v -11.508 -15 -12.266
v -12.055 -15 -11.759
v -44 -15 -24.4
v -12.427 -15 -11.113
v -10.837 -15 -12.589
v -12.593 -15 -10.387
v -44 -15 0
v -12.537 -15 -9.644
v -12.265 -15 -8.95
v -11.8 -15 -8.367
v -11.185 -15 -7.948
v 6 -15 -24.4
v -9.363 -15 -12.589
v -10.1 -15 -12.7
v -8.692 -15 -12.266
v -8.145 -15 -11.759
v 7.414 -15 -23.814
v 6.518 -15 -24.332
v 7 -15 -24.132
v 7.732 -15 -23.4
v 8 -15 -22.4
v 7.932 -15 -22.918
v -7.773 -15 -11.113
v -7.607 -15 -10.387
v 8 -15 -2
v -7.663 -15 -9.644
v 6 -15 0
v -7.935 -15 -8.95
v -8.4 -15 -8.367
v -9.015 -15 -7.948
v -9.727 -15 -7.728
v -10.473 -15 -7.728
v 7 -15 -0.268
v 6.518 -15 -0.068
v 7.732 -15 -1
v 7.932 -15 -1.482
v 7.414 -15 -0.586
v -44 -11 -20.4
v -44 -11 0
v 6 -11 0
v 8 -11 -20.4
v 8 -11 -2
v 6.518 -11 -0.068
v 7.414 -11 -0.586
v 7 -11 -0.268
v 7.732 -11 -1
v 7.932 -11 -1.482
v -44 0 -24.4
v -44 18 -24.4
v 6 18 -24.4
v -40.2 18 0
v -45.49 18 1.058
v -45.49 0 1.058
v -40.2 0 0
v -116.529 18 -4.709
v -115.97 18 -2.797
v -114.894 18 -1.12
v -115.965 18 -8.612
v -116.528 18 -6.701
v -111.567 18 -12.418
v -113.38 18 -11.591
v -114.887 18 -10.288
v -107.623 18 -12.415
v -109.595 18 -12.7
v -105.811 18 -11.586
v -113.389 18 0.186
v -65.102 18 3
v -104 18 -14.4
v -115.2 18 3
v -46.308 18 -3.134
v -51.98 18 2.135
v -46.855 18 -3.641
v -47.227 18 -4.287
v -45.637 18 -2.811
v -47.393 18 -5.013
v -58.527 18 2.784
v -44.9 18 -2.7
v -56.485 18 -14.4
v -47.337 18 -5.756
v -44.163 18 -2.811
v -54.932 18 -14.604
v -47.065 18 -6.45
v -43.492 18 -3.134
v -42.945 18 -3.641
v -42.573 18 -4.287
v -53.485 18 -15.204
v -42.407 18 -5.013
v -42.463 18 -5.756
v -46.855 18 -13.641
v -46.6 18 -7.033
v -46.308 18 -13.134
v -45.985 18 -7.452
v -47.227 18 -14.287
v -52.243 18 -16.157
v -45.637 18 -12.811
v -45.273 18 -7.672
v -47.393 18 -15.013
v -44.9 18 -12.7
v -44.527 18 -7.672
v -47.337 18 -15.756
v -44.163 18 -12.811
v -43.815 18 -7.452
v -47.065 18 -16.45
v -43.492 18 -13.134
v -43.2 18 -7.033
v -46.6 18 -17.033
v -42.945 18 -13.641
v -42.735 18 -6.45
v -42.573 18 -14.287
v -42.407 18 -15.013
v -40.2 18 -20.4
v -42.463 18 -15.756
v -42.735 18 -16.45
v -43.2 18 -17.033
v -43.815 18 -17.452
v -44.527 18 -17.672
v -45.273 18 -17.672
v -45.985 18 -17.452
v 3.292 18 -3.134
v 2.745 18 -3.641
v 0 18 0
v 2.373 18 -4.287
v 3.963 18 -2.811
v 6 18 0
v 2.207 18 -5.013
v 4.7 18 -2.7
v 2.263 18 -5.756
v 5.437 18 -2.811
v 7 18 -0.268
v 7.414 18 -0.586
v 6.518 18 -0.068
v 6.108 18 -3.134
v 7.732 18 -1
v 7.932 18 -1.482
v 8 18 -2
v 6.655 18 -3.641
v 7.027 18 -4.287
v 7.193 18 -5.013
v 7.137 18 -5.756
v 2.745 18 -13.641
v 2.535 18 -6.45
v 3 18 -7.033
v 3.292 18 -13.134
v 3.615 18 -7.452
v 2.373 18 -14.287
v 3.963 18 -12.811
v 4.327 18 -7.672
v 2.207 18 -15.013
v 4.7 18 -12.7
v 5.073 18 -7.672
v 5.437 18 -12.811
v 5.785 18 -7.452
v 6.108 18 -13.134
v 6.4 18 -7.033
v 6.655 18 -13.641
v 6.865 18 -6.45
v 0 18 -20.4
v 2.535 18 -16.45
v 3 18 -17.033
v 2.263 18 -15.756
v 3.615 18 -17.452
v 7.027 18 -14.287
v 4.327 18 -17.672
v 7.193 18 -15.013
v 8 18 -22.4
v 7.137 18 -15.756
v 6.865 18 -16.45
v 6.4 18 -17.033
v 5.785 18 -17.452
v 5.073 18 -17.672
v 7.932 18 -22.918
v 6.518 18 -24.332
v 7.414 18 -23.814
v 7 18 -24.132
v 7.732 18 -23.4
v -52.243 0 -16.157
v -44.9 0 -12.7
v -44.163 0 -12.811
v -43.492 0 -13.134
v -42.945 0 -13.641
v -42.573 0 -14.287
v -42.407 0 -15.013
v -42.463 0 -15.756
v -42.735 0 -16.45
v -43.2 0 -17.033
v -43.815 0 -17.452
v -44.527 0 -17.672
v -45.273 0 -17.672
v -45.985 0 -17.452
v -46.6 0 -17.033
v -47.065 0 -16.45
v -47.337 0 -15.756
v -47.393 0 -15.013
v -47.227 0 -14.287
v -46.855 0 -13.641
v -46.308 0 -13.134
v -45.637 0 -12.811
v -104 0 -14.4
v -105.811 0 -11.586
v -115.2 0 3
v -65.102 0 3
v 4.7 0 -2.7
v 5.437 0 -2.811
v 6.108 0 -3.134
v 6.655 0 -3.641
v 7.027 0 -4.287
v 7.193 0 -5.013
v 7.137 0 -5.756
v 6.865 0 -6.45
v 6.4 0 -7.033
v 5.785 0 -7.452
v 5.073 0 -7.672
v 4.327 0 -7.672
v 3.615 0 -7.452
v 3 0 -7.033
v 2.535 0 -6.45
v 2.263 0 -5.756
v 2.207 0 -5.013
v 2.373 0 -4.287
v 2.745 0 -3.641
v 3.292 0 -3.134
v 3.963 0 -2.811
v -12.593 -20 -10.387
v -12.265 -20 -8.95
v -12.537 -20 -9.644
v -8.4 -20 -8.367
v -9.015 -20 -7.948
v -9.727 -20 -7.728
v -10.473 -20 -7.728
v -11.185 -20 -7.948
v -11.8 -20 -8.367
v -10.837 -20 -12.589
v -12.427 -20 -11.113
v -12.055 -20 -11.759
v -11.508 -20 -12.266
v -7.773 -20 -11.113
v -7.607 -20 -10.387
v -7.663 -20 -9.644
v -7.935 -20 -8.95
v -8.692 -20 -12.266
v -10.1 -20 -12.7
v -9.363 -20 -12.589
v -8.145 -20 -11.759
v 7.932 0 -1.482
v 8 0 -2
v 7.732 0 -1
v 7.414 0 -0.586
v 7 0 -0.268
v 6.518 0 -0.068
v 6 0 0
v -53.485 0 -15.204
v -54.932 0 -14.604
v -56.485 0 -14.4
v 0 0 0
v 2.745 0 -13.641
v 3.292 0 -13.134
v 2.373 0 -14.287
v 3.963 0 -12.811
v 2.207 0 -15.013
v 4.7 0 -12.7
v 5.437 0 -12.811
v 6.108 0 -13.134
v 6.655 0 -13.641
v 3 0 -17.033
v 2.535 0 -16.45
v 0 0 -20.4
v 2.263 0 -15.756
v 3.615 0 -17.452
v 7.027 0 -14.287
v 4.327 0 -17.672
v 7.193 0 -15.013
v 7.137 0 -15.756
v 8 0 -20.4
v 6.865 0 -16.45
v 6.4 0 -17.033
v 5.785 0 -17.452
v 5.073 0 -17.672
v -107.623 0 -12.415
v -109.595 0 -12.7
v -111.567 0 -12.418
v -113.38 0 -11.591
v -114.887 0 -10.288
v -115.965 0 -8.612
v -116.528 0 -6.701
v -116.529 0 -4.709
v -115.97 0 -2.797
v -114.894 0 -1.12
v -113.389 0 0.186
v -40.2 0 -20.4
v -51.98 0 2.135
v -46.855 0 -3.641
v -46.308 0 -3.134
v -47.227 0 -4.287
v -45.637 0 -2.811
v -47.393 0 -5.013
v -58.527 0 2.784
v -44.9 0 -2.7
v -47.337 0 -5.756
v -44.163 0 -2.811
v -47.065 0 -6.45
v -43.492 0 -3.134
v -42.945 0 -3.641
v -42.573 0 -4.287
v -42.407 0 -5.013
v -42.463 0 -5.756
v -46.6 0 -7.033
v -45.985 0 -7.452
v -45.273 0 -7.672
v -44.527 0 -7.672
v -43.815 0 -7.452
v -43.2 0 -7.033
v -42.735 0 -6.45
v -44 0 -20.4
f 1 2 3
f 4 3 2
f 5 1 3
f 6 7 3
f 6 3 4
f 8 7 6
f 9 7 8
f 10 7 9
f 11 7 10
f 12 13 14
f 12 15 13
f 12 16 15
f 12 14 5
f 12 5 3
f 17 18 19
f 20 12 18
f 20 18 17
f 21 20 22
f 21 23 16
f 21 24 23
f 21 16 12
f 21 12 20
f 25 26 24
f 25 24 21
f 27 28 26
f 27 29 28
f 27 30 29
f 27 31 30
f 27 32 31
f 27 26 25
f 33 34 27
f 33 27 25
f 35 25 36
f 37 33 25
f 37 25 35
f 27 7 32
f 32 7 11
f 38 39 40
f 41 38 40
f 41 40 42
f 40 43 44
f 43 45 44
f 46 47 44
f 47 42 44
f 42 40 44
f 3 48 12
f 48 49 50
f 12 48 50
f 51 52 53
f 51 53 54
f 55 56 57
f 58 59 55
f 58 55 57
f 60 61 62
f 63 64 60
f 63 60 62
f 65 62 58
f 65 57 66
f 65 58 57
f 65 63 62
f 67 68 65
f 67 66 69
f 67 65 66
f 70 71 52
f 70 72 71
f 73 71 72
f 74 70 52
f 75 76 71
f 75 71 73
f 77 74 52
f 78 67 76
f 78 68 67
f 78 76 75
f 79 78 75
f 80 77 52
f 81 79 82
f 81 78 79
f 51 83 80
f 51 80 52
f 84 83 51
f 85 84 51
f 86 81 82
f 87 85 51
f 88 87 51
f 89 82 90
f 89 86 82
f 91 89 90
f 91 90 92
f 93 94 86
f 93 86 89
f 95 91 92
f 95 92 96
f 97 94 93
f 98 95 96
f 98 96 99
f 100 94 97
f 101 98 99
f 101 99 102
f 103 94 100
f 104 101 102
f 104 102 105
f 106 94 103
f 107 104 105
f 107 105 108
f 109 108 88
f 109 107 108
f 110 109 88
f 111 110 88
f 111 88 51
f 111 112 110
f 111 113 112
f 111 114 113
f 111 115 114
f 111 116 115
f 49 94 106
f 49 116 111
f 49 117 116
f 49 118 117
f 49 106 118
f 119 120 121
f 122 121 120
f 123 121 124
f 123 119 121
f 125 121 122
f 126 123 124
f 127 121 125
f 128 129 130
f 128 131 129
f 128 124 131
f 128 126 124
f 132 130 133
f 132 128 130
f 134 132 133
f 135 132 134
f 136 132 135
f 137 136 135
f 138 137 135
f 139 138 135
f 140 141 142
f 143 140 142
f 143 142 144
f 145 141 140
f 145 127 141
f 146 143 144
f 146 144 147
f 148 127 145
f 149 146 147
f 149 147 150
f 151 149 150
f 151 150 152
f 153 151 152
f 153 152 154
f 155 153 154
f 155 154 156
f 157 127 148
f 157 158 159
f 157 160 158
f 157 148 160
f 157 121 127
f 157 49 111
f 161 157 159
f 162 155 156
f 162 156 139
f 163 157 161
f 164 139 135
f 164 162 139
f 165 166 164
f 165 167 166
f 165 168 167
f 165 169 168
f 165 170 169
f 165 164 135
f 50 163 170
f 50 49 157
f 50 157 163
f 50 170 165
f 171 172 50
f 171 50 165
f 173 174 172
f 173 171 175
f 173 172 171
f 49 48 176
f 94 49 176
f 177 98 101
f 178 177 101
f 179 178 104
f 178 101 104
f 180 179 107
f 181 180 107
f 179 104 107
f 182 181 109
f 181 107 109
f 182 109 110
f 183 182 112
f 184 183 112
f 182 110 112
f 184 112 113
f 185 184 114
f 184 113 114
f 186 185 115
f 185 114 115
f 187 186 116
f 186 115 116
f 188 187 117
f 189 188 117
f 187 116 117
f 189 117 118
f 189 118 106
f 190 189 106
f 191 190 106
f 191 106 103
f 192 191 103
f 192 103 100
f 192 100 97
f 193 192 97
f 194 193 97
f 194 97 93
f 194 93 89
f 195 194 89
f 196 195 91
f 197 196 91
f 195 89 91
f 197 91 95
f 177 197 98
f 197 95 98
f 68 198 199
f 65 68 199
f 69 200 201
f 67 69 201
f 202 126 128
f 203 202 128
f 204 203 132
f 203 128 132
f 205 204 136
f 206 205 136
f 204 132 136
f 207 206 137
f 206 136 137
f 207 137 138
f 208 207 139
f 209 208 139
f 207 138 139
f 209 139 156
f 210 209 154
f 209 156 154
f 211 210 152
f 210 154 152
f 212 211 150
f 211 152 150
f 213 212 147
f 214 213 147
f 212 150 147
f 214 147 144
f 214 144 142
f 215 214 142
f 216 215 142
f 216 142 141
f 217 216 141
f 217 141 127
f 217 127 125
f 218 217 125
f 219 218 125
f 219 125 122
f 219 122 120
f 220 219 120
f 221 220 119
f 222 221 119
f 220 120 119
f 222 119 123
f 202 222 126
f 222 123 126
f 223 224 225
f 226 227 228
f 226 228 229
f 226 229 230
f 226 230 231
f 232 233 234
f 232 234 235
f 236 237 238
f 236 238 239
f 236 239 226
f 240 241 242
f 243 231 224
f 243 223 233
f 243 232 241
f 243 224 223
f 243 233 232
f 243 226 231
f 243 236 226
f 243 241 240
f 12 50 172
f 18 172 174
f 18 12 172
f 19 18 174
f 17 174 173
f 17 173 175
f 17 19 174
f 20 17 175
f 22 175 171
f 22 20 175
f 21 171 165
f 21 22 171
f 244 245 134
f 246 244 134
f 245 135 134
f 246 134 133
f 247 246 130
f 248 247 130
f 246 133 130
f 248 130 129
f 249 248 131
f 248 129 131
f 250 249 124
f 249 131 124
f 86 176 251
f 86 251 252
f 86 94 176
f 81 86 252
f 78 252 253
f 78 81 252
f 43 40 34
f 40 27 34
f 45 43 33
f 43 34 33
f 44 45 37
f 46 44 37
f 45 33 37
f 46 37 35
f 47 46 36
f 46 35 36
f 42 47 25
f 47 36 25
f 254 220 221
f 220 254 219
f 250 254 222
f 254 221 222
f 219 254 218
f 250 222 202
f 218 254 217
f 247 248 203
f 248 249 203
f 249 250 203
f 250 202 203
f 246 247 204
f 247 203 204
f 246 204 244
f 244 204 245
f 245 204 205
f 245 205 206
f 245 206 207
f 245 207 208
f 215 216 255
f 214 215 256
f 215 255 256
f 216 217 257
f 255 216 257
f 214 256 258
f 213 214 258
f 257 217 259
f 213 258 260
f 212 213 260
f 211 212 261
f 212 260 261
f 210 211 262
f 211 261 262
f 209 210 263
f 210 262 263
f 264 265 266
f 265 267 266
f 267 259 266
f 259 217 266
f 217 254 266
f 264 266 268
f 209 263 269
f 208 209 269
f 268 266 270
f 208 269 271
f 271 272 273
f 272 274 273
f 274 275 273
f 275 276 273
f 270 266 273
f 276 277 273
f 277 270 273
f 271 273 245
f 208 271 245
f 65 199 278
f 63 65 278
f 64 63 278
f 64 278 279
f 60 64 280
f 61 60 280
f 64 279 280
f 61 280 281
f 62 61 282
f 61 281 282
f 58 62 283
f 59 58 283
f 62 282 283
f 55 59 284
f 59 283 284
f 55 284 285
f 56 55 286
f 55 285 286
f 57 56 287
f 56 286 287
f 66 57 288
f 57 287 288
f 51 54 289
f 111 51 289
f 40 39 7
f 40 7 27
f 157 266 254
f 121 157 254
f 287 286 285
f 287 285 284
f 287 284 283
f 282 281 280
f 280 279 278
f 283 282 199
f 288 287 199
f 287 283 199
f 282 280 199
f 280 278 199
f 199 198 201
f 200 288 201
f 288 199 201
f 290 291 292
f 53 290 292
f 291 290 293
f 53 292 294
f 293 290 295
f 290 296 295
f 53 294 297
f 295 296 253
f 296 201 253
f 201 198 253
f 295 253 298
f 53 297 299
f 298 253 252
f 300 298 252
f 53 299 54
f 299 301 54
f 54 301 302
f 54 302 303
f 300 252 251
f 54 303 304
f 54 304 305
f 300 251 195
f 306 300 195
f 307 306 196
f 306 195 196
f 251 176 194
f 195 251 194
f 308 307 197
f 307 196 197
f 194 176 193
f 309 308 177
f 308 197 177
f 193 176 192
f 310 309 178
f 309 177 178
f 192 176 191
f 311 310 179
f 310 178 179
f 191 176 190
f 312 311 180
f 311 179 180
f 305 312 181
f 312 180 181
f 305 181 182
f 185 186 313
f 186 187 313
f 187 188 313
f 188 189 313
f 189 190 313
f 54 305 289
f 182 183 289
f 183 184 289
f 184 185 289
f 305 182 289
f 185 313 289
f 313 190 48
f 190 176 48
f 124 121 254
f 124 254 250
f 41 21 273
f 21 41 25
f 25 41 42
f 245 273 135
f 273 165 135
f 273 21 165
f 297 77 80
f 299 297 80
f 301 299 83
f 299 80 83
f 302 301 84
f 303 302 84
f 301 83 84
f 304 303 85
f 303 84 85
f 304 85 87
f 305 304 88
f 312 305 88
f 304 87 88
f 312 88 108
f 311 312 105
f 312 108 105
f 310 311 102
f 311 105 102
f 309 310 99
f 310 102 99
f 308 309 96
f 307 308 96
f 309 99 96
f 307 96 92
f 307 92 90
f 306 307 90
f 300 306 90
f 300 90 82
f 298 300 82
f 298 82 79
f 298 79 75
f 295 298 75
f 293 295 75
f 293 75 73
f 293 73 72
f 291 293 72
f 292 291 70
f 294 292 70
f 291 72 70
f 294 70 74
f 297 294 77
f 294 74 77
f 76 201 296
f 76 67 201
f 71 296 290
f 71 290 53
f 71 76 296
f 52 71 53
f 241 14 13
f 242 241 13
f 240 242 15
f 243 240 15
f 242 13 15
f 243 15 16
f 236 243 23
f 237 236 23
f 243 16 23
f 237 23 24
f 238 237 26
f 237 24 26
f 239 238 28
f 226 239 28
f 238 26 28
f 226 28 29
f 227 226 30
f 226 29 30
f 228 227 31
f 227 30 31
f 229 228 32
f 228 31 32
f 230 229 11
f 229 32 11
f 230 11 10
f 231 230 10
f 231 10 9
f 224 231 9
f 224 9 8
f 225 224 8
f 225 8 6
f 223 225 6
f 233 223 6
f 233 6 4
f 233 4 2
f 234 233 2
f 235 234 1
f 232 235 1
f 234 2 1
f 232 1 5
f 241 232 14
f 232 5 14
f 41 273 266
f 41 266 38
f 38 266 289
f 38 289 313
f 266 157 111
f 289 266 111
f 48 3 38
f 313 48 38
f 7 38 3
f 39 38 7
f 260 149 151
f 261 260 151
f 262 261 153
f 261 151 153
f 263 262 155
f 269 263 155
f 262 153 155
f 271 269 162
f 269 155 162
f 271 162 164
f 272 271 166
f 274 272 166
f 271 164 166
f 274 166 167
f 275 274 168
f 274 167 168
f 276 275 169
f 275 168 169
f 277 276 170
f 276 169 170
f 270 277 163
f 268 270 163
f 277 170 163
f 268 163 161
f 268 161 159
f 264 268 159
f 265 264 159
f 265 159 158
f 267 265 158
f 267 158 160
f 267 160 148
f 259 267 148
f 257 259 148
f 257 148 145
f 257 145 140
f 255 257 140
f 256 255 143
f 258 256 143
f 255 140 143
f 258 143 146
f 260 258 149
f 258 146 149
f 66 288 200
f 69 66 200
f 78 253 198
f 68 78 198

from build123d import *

# Parameters (mm, degrees)
BOSS_EXTRUDE1_DEPTH = 18
SKETCH2_W           = 52
SKETCH2_H           = 29
BOSS_EXTRUDE2_DEPTH = 4
SKETCH3_W           = 52
SKETCH3_H           = 24.4
BOSS_EXTRUDE3_DEPTH = 4
SKETCH4_R           = 2.5
BOSS_EXTRUDE4_DEPTH = 5
SKETCH5_R           = 2.5
CUT_EXTRUDE1_DEPTH  = 18
FILLET2_R           = 6
FILLET4_R           = 2
FILLET5_R           = 100


with BuildPart() as part:
    # Sketch1 → Boss-Extrude1 (new body)
    with BuildSketch(Plane(origin=(0, 0, 0), x_dir=(1, 0, 0), z_dir=(0, 1, 0))):
        with BuildLine():
            Line((-40.2, 0), (-40.2, 20.4))
            Line((-40.2, 20.4), (0, 20.4))
            Line((0, 20.4), (0, 0))
            Line((0, 0), (8, 0))
            Line((8, 0), (8, 24.4))
            Line((8, 24.4), (-44, 24.4))
            Line((-44, 24.4), (-54, 14.4))
            Line((-54, 14.4), (-104, 14.4))
            Line((-104, 14.4), (-105.811278075, 11.586050134))
            ThreePointArc((-105.811278075, 11.586050134), (-115.486050134, 9.488721925), (-113.388721925, -0.186050134))
            Line((-113.388721925, -0.186050134), (-115.2, -3))
            Line((-115.2, -3), (-55.2, -3))
            Line((-55.2, -3), (-40.2, 0))
        make_face()
    extrude(amount=BOSS_EXTRUDE1_DEPTH)

    # Sketch2 → Boss-Extrude2 (add)
    with BuildSketch(Plane(origin=(0, 0, -24.4), x_dir=(-1, 0, 0), z_dir=(0, 0, -1))):
        with Locations((18, 3.5)):
            Rectangle(SKETCH2_W, SKETCH2_H)
    extrude(amount=-BOSS_EXTRUDE2_DEPTH)

    # Sketch3 → Boss-Extrude3 (add)
    with BuildSketch(Plane.XZ.offset(11)):
        with Locations((-18, -12.2)):
            Rectangle(SKETCH3_W, SKETCH3_H)
    extrude(amount=BOSS_EXTRUDE3_DEPTH)

    # Sketch4 → Boss-Extrude4 (add)
    with BuildSketch(Plane.XZ.offset(15)):
        with Locations(Location((-10.1, -10.2, 0), (0, 0, 270))):
            Circle(SKETCH4_R)
    extrude(amount=BOSS_EXTRUDE4_DEPTH)

    # Sketch5 → Cut-Extrude1 (cut)
    with BuildSketch(Plane(origin=(0, 18, 0), x_dir=(1, 0, 0), z_dir=(0, 1, 0))):
        with Locations(Location((4.7, 15.2, 0), (0, 0, 270))):
            Circle(SKETCH5_R)
        with Locations(Location((4.7, 5.2, 0), (0, 0, 270))):
            Circle(SKETCH5_R)
        with Locations(Location((-44.9, 5.2, 0), (0, 0, 270))):
            Circle(SKETCH5_R)
        with Locations(Location((-44.9, 15.2, 0), (0, 0, 270))):
            Circle(SKETCH5_R)
    extrude(amount=-CUT_EXTRUDE1_DEPTH, mode=Mode.SUBTRACT)

    # Fillet2
    fillet2_edges = [part.edges().sort_by_distance(p)[0] for p in [
        (-54, 9, -14.4),
    ]]
    fillet(fillet2_edges, radius=FILLET2_R)

    # Fillet4
    fillet4_edges = [part.edges().sort_by_distance(p)[0] for p in [
        (8, 1.5, -24.4),
        (8, 9, 0),
        (8, -13, 0),
    ]]
    fillet(fillet4_edges, radius=FILLET4_R)

    # Fillet5
    fillet5_edges = [part.edges().sort_by_distance(p)[0] for p in [
        (-55.2, 9, 3),
    ]]
    fillet(fillet5_edges, radius=FILLET5_R)


solid = part.part
